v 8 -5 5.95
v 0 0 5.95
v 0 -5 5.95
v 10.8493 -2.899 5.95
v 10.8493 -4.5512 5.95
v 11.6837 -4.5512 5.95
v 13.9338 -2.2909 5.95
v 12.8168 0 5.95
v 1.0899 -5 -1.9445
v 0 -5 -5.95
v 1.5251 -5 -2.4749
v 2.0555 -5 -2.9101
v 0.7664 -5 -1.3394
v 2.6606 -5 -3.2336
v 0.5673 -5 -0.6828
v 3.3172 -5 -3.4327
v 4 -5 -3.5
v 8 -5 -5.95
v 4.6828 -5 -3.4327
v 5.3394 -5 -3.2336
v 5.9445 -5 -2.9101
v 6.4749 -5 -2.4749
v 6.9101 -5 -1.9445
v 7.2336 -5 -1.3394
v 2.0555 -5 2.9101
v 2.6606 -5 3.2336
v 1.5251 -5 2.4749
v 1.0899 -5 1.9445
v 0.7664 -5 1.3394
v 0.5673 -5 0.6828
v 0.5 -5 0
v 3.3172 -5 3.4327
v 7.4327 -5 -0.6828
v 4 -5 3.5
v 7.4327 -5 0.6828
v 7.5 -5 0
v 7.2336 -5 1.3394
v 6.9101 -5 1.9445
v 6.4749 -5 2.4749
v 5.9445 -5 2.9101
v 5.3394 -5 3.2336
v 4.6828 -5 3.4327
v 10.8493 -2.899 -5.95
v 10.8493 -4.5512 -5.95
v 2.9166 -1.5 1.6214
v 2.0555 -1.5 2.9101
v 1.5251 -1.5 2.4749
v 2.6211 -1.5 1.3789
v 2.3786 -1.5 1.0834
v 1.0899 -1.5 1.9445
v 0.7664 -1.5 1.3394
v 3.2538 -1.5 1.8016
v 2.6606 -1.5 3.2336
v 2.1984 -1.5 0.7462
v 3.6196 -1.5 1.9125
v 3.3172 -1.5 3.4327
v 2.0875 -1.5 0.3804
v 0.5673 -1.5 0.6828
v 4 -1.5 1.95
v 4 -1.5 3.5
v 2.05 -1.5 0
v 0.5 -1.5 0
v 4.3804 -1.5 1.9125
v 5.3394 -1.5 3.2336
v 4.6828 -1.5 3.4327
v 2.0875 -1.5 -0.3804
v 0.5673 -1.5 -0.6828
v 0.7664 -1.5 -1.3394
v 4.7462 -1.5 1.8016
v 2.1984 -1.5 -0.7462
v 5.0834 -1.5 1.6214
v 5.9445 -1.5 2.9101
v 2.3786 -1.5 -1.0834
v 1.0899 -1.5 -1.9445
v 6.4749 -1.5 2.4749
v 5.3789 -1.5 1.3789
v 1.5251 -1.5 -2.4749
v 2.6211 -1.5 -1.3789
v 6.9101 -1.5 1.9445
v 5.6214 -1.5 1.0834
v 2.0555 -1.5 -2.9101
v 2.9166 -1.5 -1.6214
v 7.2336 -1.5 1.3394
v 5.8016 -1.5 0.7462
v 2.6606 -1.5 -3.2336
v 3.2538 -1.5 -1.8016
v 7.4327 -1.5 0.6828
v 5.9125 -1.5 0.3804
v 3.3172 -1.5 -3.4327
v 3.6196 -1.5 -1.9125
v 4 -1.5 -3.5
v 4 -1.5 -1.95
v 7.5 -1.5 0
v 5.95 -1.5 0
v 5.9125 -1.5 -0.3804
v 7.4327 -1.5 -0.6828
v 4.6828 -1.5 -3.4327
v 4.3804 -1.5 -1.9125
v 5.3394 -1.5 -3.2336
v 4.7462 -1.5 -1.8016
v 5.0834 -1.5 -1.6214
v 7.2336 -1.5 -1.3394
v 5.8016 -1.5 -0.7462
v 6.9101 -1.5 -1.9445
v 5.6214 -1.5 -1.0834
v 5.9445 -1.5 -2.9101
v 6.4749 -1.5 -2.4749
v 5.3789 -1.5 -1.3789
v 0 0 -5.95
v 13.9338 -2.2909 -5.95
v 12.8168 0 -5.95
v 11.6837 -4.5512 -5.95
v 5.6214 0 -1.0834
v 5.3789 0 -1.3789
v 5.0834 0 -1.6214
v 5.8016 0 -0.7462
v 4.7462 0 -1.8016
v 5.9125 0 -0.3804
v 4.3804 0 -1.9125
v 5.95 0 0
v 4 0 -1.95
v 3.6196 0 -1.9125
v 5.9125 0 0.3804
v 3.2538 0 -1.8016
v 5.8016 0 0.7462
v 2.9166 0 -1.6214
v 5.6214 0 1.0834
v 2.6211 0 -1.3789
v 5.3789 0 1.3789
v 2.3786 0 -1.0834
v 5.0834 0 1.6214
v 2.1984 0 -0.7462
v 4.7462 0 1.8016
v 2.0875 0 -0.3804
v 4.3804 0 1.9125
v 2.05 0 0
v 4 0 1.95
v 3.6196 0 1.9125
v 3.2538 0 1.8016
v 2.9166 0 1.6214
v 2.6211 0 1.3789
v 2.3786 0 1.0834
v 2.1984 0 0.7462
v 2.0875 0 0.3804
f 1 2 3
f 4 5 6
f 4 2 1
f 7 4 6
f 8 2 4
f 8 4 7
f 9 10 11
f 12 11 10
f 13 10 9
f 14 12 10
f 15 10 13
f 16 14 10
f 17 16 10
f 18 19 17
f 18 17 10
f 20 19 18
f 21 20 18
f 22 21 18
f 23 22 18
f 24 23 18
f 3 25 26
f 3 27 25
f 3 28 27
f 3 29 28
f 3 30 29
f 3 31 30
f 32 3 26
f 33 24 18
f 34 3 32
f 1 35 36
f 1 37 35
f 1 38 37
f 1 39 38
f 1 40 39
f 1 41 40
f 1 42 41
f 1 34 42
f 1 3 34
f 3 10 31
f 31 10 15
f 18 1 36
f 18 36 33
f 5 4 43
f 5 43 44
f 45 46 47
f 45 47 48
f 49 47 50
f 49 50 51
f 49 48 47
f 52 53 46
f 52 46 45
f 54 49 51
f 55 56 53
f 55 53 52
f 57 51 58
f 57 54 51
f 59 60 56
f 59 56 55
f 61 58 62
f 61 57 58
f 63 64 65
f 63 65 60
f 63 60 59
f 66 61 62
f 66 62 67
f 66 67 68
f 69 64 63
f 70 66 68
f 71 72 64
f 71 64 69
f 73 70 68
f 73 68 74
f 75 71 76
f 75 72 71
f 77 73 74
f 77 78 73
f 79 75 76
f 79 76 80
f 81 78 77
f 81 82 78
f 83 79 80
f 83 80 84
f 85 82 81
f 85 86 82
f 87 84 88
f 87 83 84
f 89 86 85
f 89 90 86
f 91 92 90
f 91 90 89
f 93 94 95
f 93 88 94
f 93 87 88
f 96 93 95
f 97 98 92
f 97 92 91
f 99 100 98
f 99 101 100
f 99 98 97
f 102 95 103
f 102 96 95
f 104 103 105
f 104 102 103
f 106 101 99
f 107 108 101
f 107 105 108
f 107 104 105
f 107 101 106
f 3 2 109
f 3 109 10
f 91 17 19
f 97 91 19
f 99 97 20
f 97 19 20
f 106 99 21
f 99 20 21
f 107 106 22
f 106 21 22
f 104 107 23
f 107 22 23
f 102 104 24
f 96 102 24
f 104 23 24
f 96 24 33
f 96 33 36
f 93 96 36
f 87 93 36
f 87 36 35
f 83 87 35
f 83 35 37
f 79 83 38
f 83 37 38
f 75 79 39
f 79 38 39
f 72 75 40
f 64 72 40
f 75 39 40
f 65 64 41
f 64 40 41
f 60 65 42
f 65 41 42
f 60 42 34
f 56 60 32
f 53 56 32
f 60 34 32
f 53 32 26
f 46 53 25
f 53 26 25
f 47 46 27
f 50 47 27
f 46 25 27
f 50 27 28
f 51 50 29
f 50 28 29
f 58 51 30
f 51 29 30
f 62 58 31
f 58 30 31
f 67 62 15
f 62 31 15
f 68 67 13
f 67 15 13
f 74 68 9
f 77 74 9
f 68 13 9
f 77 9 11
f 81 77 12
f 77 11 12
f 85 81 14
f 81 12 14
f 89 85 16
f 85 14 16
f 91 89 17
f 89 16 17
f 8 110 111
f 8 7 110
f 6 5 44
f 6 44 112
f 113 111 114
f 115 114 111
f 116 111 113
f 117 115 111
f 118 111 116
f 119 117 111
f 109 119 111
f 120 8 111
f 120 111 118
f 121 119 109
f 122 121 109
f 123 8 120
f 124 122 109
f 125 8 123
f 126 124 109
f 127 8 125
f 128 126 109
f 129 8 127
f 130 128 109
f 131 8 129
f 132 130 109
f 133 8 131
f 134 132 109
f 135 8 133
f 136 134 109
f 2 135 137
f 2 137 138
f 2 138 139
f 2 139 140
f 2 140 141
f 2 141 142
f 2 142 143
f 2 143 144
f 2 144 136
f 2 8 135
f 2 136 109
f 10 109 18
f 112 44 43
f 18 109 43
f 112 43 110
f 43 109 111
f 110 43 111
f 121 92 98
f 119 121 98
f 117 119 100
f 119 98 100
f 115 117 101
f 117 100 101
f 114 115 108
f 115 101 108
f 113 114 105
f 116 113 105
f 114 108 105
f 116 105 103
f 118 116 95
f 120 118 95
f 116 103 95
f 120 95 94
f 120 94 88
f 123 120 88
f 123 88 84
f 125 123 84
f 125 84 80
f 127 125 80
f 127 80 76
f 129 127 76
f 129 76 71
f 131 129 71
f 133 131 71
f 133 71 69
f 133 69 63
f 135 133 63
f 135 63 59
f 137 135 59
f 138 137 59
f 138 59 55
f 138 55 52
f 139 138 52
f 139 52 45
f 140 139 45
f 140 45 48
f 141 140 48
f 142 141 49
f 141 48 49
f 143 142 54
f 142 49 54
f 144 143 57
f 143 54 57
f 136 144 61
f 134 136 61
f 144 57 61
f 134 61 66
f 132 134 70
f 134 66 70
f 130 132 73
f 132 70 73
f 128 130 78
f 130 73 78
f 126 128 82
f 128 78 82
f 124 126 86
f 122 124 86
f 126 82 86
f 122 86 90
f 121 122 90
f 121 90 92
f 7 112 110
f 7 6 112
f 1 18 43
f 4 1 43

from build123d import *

# Parameters (mm, degrees)
EXTRUDE_1_DEPTH     = 5.95
CUT_EXTRUDE_1_REACH = 17.955
SKETCH_2_R          = 1.95
SKETCH_3_R          = 3.5
CUT_EXTRUDE_2_DEPTH = 3.5


with BuildPart() as part:
    # 스케치1 → 보스-돌출1 (new, symmetric)
    with BuildSketch(Plane.XY):
        Polygon((12.816760605, 0), (0, 0), (0, -5), (8, -5), (10.849275014, -2.899040406), (10.849275014, -4.551199566), (11.683700245, -4.551199566), (13.93379398, -2.290921493), align=None)
    extrude(amount=EXTRUDE_1_DEPTH, both=True)

    # 스케치2 → 컷-돌출1 (cut, up to next)
    with BuildSketch(Plane.XZ.offset(5), mode=Mode.PRIVATE) as cut_extrude_1_sk1:
        with Locations(Location((4, 0, 0), (0, 0, 270))):
            Circle(SKETCH_2_R)
    cut_extrude_1_tool1 = extrude(cut_extrude_1_sk1.sketch, amount=-CUT_EXTRUDE_1_REACH, mode=Mode.PRIVATE) & part.part
    add(cut_extrude_1_tool1.solids().sort_by_distance((4, -5, 0))[0], mode=Mode.SUBTRACT)

    # 스케치3 → 컷-돌출2 (cut)
    with BuildSketch(Plane.XZ.offset(5)):
        with Locations(Location((4, 0, 0), (0, 0, 270))):
            Circle(SKETCH_3_R)
    extrude(amount=-CUT_EXTRUDE_2_DEPTH, mode=Mode.SUBTRACT)


solid = part.part
